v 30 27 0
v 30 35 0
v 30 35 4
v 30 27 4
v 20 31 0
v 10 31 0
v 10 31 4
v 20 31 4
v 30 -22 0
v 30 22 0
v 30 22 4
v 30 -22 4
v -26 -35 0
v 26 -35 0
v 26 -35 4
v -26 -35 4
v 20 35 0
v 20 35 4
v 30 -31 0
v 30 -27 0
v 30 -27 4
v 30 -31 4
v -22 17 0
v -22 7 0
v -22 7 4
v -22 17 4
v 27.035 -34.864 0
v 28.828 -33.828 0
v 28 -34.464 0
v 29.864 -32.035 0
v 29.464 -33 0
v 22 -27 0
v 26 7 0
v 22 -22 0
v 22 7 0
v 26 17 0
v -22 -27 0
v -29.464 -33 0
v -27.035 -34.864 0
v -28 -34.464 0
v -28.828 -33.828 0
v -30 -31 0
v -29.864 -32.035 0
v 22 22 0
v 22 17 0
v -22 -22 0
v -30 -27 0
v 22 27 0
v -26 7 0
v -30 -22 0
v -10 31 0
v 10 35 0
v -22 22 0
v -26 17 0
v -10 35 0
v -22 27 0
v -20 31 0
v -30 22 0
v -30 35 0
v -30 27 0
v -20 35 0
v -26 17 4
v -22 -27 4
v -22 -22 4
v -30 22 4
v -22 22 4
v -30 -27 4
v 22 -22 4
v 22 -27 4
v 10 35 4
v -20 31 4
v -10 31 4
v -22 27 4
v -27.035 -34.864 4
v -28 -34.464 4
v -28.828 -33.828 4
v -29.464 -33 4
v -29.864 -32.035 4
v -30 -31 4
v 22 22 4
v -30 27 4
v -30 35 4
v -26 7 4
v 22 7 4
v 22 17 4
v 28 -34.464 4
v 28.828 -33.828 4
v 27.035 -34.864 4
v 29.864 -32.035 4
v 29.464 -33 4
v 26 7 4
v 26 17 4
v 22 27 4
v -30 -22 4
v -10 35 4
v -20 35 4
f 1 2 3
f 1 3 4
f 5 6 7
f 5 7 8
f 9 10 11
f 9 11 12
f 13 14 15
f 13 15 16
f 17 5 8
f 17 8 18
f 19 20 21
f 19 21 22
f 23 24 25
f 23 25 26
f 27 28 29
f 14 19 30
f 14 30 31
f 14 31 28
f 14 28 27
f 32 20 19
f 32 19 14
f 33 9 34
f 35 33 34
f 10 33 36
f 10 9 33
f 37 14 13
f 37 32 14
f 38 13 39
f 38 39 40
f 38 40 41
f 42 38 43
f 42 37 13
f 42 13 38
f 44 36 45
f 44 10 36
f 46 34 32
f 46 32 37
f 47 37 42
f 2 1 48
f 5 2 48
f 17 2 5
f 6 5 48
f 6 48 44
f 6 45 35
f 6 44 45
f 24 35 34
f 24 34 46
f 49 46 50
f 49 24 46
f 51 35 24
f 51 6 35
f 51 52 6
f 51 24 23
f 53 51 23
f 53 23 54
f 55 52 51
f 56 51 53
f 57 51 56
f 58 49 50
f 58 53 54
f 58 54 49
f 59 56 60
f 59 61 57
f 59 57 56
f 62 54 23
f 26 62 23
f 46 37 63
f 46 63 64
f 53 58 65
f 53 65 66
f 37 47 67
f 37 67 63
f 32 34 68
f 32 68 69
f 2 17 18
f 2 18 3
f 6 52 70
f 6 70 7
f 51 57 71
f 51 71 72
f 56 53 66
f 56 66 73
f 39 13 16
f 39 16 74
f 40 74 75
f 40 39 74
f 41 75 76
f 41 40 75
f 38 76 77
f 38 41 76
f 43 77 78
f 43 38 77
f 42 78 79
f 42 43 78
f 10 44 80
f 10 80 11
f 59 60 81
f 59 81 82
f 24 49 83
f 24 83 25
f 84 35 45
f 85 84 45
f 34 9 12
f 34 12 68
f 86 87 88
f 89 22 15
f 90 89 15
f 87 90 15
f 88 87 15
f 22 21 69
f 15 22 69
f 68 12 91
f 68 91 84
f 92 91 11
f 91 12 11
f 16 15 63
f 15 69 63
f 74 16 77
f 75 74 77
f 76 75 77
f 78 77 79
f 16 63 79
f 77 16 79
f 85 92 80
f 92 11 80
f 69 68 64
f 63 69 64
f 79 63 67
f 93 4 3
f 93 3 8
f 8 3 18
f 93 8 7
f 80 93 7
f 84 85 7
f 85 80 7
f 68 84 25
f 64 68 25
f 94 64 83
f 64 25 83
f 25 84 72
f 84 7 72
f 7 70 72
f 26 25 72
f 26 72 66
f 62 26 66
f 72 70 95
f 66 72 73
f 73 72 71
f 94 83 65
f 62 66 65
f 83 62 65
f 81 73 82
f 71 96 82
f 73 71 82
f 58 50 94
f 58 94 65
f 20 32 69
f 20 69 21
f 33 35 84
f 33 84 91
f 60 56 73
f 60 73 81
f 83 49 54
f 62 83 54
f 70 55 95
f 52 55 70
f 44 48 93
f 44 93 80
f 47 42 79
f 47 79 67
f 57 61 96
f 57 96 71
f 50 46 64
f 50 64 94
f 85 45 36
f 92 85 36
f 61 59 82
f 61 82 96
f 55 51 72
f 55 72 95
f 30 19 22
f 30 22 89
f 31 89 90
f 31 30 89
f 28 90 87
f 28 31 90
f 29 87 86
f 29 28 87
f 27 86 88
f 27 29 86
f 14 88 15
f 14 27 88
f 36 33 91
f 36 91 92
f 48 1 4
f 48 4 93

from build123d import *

# Parameters (mm, degrees)
SKETCH1_W           = 4
SKETCH1_H           = 10
BOSS_EXTRUDE2_DEPTH = 4


with BuildPart() as part:
    # Sketch1 → Boss-Extrude2 (new body)
    with BuildSketch(Plane.XY):
        with BuildLine():
            Line((-30, -27), (-22, -27))
            Line((-22, -27), (-22, -22))
            Line((-22, -22), (-30, -22))
            Line((-30, -22), (-30, 22))
            Line((-30, 22), (-22, 22))
            Line((-22, 22), (-22, 27))
            Line((-22, 27), (-30, 27))
            Line((-30, 27), (-30, 35))
            Line((-30, 35), (-20, 35))
            Line((-20, 35), (-20, 31))
            Line((-20, 31), (-10, 31))
            Line((-10, 31), (-10, 35))
            Line((-10, 35), (10, 35))
            Line((10, 35), (10, 31))
            Line((10, 31), (20, 31))
            Line((20, 31), (20, 35))
            Line((20, 35), (30, 35))
            Line((30, 35), (30, 26.999983113))
            Line((30, 26.999983113), (22, 26.999983113))
            Line((22, 26.999983113), (22, 21.999990545))
            Line((22, 21.999990545), (30, 21.999990545))
            Line((30, 21.999990545), (30, -22))
            Line((30, -22), (22, -22))
            Line((22, -22), (22, -27))
            Line((22, -27), (30, -27))
            Line((30, -27), (30, -31))
            ThreePointArc((30, -31), (28.828427125, -33.828427125), (26, -35))
            Line((26, -35), (-26, -35))
            ThreePointArc((-26, -35), (-28.828427125, -33.828427125), (-30, -31))
            Line((-30, -31), (-30, -27))
        make_face()
        with Locations((-24, 12)):
            Rectangle(SKETCH1_W, SKETCH1_H, mode=Mode.SUBTRACT)
        with Locations((24, 12)):
            Rectangle(SKETCH1_W, SKETCH1_H, mode=Mode.SUBTRACT)
    extrude(amount=BOSS_EXTRUDE2_DEPTH)


solid = part.part
